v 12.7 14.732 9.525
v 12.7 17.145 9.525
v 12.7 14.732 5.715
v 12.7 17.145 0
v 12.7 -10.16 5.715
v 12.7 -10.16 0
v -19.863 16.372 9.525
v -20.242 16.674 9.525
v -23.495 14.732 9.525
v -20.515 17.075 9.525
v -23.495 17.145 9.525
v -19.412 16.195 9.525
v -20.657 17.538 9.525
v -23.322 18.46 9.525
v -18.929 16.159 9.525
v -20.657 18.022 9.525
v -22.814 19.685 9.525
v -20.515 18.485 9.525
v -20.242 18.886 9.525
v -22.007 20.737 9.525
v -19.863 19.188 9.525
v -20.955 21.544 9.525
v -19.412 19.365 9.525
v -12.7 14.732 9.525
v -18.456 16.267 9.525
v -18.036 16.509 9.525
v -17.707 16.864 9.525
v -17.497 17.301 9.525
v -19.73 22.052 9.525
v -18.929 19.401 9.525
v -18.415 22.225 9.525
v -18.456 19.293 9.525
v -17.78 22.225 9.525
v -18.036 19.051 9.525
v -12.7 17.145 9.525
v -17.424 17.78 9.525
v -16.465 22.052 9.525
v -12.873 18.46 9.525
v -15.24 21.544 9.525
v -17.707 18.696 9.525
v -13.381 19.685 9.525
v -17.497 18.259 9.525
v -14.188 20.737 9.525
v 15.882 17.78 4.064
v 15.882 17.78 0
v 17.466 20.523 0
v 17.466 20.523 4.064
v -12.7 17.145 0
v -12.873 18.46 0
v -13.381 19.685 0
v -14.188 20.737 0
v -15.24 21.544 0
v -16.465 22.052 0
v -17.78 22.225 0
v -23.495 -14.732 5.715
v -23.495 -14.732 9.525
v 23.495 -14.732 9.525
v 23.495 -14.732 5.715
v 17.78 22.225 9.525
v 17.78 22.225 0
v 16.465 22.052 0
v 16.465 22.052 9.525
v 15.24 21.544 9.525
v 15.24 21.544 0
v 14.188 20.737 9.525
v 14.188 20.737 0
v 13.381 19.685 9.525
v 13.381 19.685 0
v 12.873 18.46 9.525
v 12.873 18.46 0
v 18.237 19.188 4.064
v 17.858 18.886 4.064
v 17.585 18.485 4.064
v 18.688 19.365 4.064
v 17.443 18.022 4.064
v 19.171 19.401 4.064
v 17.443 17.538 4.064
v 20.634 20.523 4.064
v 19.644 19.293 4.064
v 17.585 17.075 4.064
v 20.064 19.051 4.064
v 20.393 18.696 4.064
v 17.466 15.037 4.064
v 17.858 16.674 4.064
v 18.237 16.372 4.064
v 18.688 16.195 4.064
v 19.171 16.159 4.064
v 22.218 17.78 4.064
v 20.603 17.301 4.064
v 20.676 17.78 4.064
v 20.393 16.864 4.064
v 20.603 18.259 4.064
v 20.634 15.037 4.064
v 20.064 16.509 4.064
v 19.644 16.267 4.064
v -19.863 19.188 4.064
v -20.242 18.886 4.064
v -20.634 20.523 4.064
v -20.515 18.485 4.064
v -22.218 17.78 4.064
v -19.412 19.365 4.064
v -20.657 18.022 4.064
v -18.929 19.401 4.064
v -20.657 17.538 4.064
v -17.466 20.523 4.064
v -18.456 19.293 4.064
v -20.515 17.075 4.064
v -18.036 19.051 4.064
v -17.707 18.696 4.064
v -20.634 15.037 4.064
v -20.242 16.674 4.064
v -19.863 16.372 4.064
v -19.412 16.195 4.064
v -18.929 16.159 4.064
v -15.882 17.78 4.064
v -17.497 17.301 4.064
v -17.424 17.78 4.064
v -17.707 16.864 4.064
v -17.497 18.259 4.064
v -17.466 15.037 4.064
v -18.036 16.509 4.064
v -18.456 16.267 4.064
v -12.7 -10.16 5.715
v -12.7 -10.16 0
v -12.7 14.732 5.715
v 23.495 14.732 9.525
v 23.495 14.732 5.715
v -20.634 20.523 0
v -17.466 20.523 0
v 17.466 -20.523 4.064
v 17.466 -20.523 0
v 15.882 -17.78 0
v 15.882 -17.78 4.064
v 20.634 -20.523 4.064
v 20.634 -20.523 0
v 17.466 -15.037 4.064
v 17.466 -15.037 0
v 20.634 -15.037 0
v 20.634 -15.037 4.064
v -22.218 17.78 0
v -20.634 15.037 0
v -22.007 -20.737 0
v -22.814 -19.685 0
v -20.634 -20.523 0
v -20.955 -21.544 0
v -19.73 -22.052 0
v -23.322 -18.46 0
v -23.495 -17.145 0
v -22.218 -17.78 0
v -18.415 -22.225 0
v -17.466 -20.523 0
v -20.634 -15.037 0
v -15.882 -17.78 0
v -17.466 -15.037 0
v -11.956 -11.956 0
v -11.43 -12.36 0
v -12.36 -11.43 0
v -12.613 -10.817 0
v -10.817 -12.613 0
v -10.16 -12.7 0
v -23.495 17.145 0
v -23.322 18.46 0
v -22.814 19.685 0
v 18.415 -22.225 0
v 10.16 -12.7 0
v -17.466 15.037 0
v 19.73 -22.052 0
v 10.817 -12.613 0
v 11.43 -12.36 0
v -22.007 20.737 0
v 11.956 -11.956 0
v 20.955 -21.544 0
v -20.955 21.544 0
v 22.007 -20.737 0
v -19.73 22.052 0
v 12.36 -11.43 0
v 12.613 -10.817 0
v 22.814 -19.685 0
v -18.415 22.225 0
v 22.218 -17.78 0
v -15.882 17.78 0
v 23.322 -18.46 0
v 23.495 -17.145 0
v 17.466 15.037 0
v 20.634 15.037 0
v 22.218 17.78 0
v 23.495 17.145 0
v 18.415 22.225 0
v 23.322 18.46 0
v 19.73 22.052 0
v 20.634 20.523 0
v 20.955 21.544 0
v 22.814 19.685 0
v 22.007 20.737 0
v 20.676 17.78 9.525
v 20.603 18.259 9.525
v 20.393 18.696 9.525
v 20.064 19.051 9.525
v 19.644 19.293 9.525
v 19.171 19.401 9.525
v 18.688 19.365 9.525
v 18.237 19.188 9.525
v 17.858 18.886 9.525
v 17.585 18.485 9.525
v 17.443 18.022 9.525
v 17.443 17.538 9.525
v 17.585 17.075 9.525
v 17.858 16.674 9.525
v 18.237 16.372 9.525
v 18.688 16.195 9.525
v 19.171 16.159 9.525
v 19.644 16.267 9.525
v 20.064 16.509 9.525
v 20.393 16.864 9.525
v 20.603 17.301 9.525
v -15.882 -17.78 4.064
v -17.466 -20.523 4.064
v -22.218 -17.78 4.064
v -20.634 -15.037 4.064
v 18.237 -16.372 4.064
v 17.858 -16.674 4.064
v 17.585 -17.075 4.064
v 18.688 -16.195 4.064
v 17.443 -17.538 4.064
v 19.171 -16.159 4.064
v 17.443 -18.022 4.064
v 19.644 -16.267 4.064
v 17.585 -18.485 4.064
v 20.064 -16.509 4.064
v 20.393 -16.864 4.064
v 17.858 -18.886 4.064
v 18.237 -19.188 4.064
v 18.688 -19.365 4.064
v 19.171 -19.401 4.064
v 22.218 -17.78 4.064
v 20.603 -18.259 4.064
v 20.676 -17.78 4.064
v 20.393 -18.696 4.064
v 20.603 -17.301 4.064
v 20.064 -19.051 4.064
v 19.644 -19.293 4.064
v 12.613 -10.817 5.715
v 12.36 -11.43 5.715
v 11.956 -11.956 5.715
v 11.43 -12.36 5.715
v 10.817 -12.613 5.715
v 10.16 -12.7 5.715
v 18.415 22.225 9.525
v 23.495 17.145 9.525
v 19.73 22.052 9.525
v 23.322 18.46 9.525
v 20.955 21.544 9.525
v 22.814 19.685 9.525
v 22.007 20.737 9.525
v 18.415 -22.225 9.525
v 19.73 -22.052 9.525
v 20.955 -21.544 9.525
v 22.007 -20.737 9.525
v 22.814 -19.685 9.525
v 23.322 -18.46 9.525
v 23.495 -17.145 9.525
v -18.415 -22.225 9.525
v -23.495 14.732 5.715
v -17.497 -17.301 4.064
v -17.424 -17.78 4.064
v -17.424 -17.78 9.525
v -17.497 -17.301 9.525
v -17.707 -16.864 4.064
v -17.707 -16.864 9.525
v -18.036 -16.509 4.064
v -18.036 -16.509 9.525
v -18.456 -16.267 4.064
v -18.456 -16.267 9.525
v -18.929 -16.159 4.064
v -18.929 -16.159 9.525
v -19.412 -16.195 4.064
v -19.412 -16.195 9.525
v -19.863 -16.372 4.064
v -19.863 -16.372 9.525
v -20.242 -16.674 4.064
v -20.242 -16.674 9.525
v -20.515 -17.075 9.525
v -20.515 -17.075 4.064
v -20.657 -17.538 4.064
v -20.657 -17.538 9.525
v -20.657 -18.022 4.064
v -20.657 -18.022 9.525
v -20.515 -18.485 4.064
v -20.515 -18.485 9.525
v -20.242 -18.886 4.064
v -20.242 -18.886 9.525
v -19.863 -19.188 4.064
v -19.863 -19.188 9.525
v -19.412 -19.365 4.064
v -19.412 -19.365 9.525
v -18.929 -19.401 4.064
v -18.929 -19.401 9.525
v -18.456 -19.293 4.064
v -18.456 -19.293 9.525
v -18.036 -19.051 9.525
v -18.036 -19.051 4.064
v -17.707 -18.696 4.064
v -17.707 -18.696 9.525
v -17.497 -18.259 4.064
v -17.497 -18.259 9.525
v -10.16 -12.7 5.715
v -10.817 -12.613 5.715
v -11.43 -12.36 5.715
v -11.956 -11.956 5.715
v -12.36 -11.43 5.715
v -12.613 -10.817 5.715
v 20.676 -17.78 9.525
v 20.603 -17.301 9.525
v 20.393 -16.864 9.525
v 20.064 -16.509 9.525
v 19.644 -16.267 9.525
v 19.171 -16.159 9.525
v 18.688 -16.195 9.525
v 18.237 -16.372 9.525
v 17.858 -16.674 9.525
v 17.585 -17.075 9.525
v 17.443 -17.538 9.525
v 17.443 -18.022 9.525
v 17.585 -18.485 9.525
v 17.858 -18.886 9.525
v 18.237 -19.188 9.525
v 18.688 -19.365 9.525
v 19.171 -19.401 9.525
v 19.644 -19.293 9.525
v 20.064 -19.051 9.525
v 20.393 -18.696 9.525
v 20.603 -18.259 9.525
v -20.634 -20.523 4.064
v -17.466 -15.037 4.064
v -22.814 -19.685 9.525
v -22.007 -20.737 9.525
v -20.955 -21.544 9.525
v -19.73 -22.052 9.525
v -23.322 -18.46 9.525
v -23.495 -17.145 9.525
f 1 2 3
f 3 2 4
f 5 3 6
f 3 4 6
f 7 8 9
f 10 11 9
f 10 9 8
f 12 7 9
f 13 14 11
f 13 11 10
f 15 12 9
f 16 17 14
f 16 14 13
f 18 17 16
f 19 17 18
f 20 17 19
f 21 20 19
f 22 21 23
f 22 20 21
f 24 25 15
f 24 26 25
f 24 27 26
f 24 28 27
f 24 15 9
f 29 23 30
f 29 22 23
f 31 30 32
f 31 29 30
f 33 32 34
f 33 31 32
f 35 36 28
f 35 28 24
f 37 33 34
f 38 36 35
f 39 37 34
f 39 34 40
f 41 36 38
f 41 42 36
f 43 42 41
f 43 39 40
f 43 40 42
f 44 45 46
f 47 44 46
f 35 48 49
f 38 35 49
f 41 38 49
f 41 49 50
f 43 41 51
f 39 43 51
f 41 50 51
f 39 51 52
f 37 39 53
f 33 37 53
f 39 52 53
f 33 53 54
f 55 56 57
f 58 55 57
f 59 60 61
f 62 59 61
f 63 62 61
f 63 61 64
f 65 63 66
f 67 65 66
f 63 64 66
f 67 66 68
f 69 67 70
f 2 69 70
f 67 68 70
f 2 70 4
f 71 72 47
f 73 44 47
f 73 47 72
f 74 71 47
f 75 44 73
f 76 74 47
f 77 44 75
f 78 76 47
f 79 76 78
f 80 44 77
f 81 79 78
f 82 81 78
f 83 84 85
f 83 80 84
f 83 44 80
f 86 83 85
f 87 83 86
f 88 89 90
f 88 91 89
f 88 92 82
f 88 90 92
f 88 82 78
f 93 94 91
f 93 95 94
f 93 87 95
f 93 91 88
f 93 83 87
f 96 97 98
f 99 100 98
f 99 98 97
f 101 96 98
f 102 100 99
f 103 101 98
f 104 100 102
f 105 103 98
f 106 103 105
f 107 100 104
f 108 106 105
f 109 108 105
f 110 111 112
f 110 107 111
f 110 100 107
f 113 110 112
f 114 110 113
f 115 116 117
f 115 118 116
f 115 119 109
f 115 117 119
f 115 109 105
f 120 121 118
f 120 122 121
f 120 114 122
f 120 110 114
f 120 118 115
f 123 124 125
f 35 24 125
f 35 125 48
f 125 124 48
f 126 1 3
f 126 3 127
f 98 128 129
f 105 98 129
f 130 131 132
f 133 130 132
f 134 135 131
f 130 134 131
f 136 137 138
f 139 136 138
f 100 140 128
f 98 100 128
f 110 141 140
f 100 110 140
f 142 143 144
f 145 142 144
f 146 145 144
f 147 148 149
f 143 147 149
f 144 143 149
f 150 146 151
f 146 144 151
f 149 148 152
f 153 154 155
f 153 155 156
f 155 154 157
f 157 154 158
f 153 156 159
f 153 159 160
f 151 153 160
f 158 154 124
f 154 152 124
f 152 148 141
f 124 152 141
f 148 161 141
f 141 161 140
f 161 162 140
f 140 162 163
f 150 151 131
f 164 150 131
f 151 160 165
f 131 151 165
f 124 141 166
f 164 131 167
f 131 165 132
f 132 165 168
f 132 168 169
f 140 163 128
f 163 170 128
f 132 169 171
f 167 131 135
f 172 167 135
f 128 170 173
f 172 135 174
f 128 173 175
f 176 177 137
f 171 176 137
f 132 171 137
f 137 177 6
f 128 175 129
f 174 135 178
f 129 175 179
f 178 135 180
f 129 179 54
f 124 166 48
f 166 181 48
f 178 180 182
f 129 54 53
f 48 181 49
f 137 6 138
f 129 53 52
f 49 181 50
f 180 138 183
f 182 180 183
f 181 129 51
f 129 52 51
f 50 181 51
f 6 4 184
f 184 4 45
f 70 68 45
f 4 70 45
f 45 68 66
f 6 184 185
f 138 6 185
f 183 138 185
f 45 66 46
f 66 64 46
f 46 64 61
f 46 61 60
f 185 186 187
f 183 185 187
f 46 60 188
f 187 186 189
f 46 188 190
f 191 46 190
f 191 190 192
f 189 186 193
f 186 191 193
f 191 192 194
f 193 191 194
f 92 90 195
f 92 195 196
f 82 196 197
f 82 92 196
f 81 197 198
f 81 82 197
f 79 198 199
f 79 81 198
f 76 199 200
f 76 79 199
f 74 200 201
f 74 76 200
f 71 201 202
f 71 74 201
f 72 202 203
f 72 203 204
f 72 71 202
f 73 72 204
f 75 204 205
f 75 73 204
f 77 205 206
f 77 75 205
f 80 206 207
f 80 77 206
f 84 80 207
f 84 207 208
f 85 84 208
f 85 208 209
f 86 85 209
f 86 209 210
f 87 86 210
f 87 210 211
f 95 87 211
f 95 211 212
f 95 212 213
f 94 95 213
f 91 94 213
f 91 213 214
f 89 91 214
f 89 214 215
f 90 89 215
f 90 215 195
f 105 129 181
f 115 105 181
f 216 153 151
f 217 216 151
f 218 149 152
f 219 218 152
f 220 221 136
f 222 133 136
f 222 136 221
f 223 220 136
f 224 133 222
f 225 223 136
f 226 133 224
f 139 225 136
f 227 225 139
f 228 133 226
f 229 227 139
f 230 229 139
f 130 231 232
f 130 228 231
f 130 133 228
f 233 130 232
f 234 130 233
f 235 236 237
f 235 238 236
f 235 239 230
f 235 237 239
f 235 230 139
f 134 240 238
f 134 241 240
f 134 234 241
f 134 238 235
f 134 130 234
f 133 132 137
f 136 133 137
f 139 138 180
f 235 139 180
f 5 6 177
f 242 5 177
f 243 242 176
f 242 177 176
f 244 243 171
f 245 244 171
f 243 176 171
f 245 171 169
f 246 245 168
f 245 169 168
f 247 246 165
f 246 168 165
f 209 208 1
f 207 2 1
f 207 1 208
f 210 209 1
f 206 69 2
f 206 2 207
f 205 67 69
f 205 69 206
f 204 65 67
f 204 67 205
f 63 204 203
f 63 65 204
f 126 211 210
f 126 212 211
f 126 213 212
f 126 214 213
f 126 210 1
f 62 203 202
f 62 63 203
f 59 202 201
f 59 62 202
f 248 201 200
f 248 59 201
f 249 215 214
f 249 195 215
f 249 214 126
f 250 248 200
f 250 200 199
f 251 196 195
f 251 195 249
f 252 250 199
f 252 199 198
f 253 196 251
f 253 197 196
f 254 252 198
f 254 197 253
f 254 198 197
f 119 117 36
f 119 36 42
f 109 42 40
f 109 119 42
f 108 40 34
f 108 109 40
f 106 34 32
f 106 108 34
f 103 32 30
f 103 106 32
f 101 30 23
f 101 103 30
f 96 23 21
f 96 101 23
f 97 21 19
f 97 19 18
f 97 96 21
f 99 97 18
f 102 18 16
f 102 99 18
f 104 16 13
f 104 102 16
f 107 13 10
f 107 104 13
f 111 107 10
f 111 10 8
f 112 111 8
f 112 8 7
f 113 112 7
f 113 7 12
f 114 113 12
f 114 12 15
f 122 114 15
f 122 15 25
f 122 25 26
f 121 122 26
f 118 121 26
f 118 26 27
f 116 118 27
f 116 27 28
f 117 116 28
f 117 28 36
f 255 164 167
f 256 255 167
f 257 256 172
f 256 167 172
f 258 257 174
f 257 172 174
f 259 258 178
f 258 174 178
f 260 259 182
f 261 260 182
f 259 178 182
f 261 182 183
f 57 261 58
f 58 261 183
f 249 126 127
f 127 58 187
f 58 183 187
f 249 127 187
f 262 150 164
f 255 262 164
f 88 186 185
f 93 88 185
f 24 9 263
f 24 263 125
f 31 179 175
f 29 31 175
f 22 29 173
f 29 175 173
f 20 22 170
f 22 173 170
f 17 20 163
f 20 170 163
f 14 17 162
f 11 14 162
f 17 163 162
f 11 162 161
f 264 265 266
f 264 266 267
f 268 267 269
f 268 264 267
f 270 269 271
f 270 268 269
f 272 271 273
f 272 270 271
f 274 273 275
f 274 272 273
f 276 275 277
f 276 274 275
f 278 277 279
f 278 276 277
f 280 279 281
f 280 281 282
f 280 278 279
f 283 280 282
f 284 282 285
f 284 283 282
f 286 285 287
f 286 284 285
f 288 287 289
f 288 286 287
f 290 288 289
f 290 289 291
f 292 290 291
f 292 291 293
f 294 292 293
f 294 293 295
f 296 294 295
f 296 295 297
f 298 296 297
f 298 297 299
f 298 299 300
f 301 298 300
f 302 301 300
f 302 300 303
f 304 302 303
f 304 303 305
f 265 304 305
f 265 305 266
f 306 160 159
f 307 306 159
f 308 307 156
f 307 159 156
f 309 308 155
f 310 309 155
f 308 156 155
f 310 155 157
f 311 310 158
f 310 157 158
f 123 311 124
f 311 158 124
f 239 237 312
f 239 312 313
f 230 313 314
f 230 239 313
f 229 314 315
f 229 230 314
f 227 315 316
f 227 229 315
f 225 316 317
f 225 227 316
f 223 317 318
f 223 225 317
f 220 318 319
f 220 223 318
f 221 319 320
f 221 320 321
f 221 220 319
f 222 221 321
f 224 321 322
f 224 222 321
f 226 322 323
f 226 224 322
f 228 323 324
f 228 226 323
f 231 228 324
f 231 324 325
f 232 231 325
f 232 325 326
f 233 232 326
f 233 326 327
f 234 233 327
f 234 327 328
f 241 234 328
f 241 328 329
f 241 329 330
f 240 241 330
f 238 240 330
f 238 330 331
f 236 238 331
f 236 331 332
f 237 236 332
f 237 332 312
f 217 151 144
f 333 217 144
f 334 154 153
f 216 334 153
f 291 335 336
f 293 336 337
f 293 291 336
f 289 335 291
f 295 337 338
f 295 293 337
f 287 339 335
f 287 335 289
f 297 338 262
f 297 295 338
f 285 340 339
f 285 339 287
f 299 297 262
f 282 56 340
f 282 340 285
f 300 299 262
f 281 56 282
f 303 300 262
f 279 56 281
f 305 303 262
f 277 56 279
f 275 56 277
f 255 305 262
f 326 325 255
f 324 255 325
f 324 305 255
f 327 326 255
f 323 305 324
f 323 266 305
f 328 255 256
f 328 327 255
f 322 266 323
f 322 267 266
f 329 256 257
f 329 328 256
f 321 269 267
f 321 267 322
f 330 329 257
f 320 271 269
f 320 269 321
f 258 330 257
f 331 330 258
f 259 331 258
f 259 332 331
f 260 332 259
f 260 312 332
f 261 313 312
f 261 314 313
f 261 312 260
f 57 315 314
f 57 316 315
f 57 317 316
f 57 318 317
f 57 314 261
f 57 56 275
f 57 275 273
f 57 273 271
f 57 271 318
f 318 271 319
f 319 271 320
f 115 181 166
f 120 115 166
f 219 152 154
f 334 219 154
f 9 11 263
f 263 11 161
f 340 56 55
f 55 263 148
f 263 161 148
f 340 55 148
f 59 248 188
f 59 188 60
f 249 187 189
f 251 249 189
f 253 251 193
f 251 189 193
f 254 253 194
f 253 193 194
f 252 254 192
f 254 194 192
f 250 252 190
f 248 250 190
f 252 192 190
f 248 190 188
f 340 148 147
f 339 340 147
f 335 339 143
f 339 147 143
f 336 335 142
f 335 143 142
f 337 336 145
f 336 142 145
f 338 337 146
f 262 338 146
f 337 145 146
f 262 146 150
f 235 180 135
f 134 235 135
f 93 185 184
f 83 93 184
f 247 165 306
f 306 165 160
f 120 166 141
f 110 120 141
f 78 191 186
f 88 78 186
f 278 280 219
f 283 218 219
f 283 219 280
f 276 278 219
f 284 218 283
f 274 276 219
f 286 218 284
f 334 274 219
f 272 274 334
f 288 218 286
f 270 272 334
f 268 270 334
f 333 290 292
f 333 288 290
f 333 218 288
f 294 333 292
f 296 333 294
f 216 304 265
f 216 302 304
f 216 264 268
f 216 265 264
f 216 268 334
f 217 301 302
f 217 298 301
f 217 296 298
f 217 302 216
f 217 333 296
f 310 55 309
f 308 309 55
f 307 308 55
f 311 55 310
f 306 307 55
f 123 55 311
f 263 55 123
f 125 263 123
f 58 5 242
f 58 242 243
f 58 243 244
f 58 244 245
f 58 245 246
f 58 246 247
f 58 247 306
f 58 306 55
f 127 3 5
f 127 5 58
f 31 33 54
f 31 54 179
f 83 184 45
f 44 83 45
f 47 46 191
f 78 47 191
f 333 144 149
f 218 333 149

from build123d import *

# Parameters (mm, degrees)
F0_R     = 1.6256
F1_DEPTH = 9.525
F2_W     = 46.99
F2_H     = 29.464
F3_DEPTH = 3.81
F5_DEPTH = 4.064


with BuildPart() as f1:
    # F0 (on Top) → F1 (new body)
    with BuildSketch(Plane.XY):
        with BuildLine():
            ThreePointArc((23.495, 17.145), (22.007102, 20.737102), (18.415, 22.225))
            Line((18.415, 22.225), (17.78, 22.225))
            ThreePointArc((17.78, 22.225), (14.187898, 20.737102), (12.7, 17.145))
            Line((12.7, 17.145), (12.7, -10.16))
            ThreePointArc((12.7, -10.16), (11.956051, -11.956051), (10.16, -12.7))
            Line((10.16, -12.7), (-10.16, -12.7))
            ThreePointArc((-10.16, -12.7), (-11.956051, -11.956051), (-12.7, -10.16))
            Line((-12.7, -10.16), (-12.7, 17.145))
            ThreePointArc((-12.7, 17.145), (-14.187898, 20.737102), (-17.78, 22.225))
            Line((-17.78, 22.225), (-18.415, 22.225))
            ThreePointArc((-18.415, 22.225), (-22.007102, 20.737102), (-23.495, 17.145))
            Line((-23.495, 17.145), (-23.495, -17.145))
            ThreePointArc((-23.495, -17.145), (-22.007102, -20.737102), (-18.415, -22.225))
            Line((-18.415, -22.225), (18.415, -22.225))
            ThreePointArc((18.415, -22.225), (22.007102, -20.737102), (23.495, -17.145))
            Line((23.495, -17.145), (23.495, 17.145))
        make_face()
        with Locations((-19.05, -17.78)):
            Circle(F0_R, mode=Mode.SUBTRACT)
        with Locations((19.05, -17.78)):
            Circle(F0_R, mode=Mode.SUBTRACT)
        with Locations((-19.05, 17.78)):
            Circle(F0_R, mode=Mode.SUBTRACT)
        with Locations((19.05, 17.78)):
            Circle(F0_R, mode=Mode.SUBTRACT)
    extrude(amount=F1_DEPTH)

    # F2 (on face) → F3 (cut)
    with BuildSketch(Plane.XY.offset(9.525)):
        Rectangle(F2_W, F2_H)
    extrude(amount=-F3_DEPTH, mode=Mode.SUBTRACT)

    # F4 (on face) → F5 (cut)
    with BuildSketch(Plane(origin=(0, 0, 0), x_dir=(1, 0, 0), z_dir=(0, 0, -1))):
        Polygon((17.466213, -15.0368), (15.882425, -17.78), (17.466213, -20.5232), (20.633787, -20.5232), (22.217575, -17.78), (20.633787, -15.0368), align=None)
        Polygon((-17.466213, -15.0368), (-20.633787, -15.0368), (-22.217575, -17.78), (-20.633787, -20.5232), (-17.466213, -20.5232), (-15.882425, -17.78), align=None)
        Polygon((15.882425, 17.78), (17.466213, 15.0368), (20.633787, 15.0368), (22.217575, 17.78), (20.633787, 20.5232), (17.466213, 20.5232), align=None)
        Polygon((-22.217575, 17.78), (-20.633787, 15.0368), (-17.466213, 15.0368), (-15.882425, 17.78), (-17.466213, 20.5232), (-20.633787, 20.5232), align=None)
    extrude(amount=-F5_DEPTH, mode=Mode.SUBTRACT)


solid = f1.part
